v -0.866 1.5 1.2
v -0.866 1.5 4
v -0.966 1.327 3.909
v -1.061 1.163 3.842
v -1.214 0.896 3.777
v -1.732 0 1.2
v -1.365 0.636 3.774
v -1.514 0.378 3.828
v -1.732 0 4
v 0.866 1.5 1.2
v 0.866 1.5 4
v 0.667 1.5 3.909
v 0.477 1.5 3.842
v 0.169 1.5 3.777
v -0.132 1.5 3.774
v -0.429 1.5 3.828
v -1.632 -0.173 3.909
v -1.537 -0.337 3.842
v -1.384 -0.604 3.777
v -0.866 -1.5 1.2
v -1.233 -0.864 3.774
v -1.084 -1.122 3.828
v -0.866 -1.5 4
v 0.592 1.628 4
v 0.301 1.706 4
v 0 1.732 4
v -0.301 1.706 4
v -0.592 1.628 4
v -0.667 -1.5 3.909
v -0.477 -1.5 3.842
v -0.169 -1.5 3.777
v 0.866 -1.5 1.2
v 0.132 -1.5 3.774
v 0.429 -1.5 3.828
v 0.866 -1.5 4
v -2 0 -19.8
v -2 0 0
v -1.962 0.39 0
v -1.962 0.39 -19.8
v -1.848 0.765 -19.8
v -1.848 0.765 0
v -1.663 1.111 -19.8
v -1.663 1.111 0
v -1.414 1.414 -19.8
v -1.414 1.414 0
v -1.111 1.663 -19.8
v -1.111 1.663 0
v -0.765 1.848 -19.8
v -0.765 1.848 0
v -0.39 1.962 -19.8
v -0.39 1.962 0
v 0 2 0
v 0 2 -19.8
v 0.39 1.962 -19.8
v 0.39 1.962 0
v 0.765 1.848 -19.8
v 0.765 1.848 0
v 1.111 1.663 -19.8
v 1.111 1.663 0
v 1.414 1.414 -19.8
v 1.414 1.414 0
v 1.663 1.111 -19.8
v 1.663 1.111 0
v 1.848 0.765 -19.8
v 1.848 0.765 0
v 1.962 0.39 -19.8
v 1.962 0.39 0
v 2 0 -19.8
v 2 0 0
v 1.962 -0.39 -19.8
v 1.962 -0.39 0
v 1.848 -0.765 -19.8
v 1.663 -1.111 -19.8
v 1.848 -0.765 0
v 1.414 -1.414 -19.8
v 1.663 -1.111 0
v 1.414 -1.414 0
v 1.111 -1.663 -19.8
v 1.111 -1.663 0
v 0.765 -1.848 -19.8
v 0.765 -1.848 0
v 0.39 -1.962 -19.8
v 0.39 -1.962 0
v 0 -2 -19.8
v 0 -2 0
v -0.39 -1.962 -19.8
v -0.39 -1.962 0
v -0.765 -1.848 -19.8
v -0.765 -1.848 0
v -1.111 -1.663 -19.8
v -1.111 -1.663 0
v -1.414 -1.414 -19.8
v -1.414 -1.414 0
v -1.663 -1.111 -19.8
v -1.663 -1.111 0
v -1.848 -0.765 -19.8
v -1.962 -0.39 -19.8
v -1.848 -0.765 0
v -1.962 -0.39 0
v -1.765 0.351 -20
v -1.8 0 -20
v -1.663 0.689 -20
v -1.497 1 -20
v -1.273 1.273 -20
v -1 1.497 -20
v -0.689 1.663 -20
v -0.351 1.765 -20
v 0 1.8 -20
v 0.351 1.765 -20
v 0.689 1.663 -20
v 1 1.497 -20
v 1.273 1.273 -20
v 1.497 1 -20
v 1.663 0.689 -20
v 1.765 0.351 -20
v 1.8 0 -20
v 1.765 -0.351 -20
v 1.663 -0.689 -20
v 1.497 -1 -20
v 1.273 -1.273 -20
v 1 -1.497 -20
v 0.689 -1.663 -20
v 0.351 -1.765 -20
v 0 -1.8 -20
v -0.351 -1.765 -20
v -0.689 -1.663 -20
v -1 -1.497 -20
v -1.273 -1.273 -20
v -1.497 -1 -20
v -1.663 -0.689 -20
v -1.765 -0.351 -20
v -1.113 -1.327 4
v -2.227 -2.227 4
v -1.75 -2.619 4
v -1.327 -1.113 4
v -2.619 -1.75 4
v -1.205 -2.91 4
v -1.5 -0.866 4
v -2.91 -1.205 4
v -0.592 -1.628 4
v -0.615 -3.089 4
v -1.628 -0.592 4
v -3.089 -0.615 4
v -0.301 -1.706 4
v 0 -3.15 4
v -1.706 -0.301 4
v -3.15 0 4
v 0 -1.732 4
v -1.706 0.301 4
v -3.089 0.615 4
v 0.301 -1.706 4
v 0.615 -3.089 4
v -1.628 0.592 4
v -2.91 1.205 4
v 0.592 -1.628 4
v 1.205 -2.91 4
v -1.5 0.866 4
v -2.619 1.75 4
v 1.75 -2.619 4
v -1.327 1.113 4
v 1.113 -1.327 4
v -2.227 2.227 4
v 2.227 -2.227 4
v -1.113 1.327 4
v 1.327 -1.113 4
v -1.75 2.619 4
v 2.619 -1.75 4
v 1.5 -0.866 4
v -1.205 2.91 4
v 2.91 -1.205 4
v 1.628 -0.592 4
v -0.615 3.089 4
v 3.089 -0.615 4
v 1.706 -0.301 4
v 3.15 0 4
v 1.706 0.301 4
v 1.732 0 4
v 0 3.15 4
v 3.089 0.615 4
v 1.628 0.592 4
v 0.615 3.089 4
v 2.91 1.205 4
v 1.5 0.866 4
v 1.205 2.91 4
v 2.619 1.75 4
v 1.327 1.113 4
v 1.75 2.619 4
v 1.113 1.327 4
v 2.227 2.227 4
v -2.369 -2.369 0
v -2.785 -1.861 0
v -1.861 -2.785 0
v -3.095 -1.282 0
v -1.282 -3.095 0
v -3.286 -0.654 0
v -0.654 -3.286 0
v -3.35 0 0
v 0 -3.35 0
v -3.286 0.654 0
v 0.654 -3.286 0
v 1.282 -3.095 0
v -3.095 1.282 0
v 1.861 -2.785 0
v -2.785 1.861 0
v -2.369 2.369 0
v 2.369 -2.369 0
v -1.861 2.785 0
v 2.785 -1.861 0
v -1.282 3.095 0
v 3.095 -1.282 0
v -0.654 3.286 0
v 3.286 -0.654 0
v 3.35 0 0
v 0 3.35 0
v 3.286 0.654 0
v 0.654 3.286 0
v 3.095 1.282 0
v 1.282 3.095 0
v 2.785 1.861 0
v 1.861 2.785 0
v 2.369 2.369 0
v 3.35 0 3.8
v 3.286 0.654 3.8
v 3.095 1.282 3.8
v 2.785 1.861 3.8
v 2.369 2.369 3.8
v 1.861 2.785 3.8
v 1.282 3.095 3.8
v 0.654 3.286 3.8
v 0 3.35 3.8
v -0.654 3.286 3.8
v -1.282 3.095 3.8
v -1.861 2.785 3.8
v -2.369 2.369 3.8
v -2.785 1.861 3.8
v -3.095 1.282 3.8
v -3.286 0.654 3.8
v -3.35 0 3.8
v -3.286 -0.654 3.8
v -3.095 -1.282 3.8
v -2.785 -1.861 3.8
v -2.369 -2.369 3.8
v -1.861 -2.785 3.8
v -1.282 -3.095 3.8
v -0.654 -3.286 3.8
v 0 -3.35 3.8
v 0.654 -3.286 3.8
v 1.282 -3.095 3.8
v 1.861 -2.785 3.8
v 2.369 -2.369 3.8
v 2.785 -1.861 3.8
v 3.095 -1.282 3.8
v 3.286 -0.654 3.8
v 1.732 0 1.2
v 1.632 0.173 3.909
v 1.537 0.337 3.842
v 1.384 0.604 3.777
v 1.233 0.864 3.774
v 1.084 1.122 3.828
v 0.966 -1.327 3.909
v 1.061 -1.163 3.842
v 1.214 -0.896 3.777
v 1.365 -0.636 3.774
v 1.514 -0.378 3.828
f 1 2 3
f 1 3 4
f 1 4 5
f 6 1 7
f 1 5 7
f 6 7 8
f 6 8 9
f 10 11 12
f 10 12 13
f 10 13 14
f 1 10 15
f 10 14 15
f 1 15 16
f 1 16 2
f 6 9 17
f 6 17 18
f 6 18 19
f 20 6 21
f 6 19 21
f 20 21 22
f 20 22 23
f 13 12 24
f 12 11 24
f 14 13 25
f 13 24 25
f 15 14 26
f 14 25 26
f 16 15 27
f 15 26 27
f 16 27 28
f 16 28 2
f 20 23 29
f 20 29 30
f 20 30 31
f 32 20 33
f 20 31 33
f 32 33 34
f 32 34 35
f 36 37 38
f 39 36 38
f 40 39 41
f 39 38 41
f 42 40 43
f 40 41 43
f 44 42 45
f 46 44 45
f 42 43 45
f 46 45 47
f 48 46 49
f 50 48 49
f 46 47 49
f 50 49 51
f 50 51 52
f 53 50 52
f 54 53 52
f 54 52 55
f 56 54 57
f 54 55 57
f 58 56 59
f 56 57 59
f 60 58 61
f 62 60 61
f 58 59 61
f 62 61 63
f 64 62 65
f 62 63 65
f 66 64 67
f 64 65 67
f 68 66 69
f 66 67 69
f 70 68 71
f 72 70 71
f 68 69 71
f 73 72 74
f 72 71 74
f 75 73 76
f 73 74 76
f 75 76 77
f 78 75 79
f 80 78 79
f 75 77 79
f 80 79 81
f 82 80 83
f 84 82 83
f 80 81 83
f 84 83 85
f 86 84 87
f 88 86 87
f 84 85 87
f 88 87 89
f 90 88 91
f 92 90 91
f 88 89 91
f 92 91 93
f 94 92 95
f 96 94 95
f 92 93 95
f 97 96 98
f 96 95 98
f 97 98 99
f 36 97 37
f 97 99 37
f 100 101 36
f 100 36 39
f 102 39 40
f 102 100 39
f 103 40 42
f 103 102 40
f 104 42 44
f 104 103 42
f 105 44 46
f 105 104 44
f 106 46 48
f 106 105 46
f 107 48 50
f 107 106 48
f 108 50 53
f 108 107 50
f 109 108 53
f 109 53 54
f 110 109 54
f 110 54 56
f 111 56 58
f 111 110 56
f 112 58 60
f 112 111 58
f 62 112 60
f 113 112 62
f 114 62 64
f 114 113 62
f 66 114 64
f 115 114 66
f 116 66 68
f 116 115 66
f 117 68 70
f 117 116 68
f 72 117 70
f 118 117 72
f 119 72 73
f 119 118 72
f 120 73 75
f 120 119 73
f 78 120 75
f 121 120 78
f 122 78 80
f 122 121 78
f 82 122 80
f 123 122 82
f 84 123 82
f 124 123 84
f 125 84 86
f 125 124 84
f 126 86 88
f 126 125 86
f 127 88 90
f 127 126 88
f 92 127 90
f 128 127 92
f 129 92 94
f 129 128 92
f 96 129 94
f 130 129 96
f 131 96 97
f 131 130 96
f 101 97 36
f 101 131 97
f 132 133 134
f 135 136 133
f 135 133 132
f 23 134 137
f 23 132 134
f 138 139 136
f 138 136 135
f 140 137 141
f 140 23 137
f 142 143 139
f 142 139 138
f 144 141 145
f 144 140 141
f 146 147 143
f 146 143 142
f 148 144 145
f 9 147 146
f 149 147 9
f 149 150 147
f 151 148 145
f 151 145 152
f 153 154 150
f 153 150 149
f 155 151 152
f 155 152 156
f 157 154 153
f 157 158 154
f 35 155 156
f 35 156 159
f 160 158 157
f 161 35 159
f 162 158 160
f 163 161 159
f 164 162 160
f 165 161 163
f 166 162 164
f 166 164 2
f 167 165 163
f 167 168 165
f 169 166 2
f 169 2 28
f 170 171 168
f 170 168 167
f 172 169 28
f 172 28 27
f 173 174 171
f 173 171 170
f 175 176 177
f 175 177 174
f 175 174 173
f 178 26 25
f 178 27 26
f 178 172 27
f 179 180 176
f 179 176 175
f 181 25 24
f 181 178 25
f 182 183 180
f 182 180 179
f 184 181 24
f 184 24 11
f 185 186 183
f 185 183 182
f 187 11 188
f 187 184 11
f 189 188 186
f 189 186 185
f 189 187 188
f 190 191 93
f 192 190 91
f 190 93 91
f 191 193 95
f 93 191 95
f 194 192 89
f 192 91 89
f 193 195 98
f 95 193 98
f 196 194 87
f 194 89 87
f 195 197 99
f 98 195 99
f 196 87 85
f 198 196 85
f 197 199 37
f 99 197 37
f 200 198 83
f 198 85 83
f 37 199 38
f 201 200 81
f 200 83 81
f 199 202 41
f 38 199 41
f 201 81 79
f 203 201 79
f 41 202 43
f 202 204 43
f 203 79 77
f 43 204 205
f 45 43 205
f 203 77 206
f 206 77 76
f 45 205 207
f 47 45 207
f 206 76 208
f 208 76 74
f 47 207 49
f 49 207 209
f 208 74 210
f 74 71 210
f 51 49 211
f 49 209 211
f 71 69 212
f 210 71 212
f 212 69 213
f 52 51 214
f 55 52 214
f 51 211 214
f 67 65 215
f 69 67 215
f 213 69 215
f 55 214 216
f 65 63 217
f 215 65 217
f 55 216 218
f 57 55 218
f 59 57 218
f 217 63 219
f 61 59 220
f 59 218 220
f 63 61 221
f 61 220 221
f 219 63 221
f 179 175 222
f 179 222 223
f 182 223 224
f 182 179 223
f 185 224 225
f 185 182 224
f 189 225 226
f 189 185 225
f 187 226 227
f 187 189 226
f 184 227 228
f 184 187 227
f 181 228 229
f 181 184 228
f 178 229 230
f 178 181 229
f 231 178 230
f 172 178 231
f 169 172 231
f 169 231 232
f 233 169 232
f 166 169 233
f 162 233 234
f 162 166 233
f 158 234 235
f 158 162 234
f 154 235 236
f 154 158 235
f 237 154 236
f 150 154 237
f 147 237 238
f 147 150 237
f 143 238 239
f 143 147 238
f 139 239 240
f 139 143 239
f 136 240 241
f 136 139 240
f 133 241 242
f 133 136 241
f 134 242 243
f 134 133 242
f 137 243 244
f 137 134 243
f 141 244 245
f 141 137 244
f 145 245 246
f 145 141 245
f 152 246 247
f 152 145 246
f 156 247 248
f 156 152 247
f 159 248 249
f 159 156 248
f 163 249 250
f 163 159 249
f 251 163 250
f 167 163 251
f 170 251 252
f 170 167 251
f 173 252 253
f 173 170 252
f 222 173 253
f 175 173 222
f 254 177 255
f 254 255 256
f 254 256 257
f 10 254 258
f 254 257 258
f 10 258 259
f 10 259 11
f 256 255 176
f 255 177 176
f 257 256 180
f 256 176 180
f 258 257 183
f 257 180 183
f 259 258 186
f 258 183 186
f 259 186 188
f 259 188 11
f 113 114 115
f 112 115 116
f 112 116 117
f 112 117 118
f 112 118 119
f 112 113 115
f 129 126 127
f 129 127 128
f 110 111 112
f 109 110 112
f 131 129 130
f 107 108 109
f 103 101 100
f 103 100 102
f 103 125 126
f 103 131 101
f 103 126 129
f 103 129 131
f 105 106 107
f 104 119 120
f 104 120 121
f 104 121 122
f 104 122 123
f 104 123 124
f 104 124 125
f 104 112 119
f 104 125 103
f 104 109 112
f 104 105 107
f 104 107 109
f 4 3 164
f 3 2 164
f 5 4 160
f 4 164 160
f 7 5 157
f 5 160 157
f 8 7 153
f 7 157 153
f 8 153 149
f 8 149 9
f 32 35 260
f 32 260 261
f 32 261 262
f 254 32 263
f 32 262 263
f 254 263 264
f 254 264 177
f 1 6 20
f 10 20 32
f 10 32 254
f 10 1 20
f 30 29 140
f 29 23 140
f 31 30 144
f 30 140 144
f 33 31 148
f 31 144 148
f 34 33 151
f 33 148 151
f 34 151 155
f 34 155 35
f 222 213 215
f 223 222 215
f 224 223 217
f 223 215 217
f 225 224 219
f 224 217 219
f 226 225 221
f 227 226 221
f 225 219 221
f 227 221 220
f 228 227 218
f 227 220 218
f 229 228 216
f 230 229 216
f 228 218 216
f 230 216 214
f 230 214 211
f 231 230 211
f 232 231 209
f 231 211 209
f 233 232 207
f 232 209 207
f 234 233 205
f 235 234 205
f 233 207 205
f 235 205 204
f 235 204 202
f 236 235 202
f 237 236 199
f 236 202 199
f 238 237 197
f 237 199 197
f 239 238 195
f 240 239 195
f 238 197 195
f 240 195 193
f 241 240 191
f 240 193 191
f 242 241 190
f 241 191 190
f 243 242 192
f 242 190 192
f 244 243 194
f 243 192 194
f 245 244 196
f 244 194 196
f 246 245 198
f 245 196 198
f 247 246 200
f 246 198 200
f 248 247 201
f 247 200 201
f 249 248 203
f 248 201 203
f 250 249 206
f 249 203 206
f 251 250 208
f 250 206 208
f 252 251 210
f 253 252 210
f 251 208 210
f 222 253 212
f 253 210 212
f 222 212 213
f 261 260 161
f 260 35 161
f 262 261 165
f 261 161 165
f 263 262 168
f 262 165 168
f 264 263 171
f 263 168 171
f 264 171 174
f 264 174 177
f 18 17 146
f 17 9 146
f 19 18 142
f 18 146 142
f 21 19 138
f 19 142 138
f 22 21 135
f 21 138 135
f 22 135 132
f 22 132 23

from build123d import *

# Parameters (mm, degrees)
SKETCH_1_R          = 3.35
EXTRUDE_1_DEPTH     = 4
CUT_EXTRUDE_1_DEPTH = 2.8
SKETCH_3_R          = 2
EXTRUDE_2_DEPTH     = 20
SKETCH_4_R          = 1.732050808
CUT_EXTRUDE_2_DEPTH = 2
CUT_EXTRUDE_2_DRAFT = -45
CHAMFER_1_SIZE      = 0.2


with BuildPart() as part:
    # Эскиз1 → Бобышка-Вытянуть1 (new body)
    with BuildSketch(Plane.XY):
        Circle(SKETCH_1_R)
    extrude(amount=EXTRUDE_1_DEPTH)

    # Эскиз2 → Вырез-Вытянуть1 (cut)
    with BuildSketch(Plane.XY.offset(4)):
        Polygon((1.732050808, 0), (0.866025404, 1.5), (-0.866025404, 1.5), (-1.732050808, 0), (-0.866025404, -1.5), (0.866025404, -1.5), align=None)
    extrude(amount=-CUT_EXTRUDE_1_DEPTH, mode=Mode.SUBTRACT)

    # Эскиз3 → Бобышка-Вытянуть2 (add)
    with BuildSketch(Plane(origin=(0, 0, 0), x_dir=(-1, 0, 0), z_dir=(0, 0, -1))):
        Circle(SKETCH_3_R)
    extrude(amount=EXTRUDE_2_DEPTH)


with BuildPart() as cut_extrude_2_tool:
    # Эскиз4 → Вырез-Вытянуть2 (with draft: the straight prism first)
    with BuildSketch(Plane.XY.offset(4)):
        Circle(SKETCH_4_R)
    extrude(amount=-CUT_EXTRUDE_2_DEPTH)
    # Вырез-Вытянуть2: the draft: its side faces are tilted about the plane it starts from
    cut_extrude_2_sides = [cut_extrude_2_tool.faces().sort_by_distance(p)[0] for p in [
        (-1.732050808, 0, 3),
    ]]
    draft(cut_extrude_2_sides, Plane.XY.offset(4), CUT_EXTRUDE_2_DRAFT)


with BuildPart() as part_1:
    add(part.part)

    # Вырез-Вытянуть2: cut by cut_extrude_2_tool
    add(cut_extrude_2_tool.part, mode=Mode.SUBTRACT)

    # Фаска1
    chamfer_1_edges = [part_1.edges().sort_by_distance(p)[0] for p in [
        (2, 0, -20),
        (-3.35, 0, 4),
    ]]
    chamfer(chamfer_1_edges, length=CHAMFER_1_SIZE)


solid = part_1.part
